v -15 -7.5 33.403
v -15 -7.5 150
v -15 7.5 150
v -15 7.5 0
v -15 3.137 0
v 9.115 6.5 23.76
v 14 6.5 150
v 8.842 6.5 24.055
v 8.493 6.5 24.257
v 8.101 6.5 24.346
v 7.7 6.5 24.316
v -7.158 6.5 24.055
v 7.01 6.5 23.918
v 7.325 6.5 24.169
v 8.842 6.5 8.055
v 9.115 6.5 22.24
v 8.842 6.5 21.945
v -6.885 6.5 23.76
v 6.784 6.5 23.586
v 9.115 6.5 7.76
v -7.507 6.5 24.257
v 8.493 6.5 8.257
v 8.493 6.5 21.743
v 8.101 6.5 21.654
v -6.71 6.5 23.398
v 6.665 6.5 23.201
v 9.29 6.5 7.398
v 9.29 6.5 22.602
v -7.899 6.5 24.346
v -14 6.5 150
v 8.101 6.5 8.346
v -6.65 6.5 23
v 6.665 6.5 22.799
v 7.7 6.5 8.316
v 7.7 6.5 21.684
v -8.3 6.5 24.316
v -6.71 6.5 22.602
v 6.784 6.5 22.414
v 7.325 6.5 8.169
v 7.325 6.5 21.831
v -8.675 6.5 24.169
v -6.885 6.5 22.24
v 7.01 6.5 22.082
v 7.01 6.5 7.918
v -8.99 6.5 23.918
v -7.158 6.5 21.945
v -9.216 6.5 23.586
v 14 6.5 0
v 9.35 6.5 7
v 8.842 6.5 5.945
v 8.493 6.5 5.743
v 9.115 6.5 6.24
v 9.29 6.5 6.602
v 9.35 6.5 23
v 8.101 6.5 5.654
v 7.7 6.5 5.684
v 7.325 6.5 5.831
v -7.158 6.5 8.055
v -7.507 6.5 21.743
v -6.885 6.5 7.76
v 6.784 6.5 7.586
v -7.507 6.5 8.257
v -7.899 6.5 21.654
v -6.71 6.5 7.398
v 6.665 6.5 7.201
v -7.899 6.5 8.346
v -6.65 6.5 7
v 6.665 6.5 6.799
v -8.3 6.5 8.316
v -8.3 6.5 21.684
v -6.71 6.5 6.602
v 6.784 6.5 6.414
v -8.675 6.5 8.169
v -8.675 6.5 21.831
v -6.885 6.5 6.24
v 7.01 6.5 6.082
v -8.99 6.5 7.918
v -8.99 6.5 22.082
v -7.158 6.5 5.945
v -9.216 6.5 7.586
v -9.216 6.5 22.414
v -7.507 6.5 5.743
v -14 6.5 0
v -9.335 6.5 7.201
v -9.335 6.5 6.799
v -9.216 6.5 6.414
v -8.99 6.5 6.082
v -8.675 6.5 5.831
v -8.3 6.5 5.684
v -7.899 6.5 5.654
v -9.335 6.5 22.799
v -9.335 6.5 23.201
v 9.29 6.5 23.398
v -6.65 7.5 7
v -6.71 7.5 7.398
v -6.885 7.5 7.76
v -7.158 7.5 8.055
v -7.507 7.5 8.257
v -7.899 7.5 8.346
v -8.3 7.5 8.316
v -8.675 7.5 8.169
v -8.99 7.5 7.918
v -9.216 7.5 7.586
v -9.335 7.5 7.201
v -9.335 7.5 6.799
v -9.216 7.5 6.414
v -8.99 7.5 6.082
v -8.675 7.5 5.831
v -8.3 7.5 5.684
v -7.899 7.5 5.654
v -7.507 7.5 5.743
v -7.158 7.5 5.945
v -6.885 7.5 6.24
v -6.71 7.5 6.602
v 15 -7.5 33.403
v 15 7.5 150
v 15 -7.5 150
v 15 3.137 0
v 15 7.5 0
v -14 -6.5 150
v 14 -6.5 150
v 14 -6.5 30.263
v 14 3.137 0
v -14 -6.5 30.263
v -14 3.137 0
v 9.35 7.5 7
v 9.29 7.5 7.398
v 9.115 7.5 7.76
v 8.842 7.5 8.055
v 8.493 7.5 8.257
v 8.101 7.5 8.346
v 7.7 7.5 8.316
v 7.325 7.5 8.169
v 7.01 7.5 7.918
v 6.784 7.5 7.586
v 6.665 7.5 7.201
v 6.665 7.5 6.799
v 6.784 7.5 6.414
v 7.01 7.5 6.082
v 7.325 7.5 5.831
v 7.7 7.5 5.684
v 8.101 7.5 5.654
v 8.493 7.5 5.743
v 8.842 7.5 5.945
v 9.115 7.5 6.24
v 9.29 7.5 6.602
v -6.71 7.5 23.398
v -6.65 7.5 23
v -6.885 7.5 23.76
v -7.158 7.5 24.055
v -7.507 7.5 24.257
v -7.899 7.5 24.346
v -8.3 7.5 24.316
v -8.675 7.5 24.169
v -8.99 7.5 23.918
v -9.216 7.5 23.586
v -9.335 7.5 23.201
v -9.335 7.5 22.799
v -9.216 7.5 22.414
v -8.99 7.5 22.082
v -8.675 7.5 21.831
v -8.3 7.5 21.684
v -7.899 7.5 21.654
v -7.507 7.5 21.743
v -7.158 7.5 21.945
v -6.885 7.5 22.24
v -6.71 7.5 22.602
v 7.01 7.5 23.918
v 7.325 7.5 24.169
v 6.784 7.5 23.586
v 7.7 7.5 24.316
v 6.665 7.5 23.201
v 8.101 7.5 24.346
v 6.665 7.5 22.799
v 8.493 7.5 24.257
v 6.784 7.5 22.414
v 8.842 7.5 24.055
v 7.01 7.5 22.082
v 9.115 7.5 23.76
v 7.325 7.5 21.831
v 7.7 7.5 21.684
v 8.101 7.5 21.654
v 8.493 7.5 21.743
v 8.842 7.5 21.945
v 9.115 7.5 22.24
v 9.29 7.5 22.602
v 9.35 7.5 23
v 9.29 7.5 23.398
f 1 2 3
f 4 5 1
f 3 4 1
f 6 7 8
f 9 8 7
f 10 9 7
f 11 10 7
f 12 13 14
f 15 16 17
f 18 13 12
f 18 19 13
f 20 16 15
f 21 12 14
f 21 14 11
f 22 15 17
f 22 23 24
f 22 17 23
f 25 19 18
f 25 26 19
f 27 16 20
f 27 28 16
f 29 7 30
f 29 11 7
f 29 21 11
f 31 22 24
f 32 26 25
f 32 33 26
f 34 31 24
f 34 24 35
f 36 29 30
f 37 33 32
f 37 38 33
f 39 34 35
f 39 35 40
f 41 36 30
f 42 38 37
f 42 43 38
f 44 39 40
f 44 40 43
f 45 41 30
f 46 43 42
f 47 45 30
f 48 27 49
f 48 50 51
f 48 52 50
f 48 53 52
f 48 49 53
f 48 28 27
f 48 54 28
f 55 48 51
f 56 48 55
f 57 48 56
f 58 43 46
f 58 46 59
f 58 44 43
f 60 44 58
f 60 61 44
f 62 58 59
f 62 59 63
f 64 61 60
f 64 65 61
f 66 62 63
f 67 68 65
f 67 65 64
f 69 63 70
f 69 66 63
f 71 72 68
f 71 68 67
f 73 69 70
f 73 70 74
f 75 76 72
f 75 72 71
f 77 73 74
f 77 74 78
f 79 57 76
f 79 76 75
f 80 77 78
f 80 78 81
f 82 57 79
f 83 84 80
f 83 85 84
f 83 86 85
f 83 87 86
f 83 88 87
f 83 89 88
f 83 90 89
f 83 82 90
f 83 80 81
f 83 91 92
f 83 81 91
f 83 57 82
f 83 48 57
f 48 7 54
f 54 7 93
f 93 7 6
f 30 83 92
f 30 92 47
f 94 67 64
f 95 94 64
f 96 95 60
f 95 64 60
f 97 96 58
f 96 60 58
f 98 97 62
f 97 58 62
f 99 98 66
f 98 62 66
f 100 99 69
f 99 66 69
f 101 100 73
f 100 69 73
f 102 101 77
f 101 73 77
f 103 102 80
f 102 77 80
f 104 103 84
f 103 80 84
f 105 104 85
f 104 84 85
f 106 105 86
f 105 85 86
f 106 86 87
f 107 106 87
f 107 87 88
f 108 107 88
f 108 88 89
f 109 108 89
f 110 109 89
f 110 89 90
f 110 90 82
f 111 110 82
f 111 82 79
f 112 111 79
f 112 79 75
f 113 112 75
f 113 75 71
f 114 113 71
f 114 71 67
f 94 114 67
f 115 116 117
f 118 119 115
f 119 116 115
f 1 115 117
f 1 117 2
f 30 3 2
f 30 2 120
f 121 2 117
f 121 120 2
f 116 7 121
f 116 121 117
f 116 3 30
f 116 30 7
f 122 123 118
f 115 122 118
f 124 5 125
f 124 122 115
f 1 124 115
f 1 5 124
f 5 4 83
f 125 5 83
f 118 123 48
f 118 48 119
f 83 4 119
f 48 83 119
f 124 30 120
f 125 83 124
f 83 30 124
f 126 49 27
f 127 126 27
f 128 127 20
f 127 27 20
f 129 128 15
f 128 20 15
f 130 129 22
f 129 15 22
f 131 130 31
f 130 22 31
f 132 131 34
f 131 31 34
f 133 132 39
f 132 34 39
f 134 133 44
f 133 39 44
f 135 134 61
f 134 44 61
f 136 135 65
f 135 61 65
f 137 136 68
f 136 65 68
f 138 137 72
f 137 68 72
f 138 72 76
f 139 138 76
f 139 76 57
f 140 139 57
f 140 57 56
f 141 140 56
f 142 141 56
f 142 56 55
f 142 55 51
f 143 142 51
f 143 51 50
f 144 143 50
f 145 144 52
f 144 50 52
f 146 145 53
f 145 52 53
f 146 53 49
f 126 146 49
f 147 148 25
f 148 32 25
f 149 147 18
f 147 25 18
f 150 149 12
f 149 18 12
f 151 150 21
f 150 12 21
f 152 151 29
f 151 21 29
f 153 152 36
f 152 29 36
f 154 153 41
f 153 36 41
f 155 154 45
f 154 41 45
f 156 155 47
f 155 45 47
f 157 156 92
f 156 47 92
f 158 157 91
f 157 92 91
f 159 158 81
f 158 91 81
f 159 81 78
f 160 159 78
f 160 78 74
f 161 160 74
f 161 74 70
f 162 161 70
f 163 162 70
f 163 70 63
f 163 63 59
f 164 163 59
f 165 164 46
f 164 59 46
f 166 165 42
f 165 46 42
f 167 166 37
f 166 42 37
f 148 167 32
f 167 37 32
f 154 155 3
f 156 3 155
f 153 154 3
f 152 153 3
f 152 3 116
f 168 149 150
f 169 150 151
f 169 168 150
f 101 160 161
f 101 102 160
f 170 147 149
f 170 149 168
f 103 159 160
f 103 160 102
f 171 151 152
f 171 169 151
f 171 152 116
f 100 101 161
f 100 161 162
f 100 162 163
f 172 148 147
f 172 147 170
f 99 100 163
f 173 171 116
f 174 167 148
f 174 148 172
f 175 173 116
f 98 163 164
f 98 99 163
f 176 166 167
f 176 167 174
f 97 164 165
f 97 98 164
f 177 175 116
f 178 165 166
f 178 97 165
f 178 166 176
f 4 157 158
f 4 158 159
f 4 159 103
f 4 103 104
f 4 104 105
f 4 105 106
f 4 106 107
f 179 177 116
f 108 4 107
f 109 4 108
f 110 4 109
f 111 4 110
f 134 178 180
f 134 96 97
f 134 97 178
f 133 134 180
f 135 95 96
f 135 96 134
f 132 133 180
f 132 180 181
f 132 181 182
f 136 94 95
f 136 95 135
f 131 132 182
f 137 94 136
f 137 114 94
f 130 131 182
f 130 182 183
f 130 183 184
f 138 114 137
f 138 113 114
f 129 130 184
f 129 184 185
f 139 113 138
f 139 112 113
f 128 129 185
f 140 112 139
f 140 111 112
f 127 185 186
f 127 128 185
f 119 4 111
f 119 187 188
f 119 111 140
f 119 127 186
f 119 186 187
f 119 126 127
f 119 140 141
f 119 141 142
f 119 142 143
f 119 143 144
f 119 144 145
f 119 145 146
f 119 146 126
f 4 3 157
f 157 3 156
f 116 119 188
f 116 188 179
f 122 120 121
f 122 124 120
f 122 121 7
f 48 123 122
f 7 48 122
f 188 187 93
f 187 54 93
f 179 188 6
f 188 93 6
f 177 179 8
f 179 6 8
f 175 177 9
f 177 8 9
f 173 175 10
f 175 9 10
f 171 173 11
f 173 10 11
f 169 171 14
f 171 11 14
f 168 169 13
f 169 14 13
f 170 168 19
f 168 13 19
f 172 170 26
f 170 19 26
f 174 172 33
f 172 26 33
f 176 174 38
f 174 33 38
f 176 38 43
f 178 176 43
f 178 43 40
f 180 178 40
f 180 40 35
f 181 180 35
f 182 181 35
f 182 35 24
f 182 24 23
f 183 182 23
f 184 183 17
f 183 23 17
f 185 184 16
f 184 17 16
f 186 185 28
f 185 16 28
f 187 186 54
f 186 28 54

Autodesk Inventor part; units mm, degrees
ref_plane "YZ Plane" through (0, 0, 0) normal (1, 0, 0) x (0, 1, 0)
ref_plane "XZ Plane" through (0, 0, 0) normal (0, 1, 0) x (-1, 0, 0)
ref_plane "XY Plane" through (0, 0, 0) normal (0, 0, 1) x (1, 0, 0)
sketch "草图1" plane through (0, 0, 0) normal (0, 0, 1) x (1, 0, 0)
  line L0 (15, -7.5) -> (-15, -7.5)
  line L1 (-15, -7.5) -> (-15, 7.5)
  line L2 (-15, 7.5) -> (15, 7.5)
  line L3 (15, 7.5) -> (15, -7.5)
  line L4 (15, -7.5) -> (-15, 7.5) construction
  line L5 (-15, -7.5) -> (15, 7.5) construction
  line L6 (14, 6.5) -> (-14, 6.5)
  line L7 (-14, 6.5) -> (-14, -6.5)
  line L8 (-14, -6.5) -> (14, -6.5)
  line L9 (14, -6.5) -> (14, 6.5)
  point P0 (0, 0)
  dimension "d0" = 30
  dimension "d1" = 15
  dimension "d2" = 1
extrude "拉伸1" add sketch "草图1" along normal blind 150
sketch "草图2" plane through (-15, -7.5, 0) normal (0, -1, 0) x (1, 0, 0)
  line L0 (-150, 0) -> (30, 0) projected
  line L1 (30, 30) -> (30, 0) projected
  line L2 (-150, 30) -> (30, 30) projected
  line L3 (-150, 30) -> (-150, 0) projected
  circle A0 centre (7, 7) radius 1.35 projected
  circle A1 centre (23, 7) radius 1.35 projected
  circle A2 centre (23, 23) radius 1.35 projected
  circle A3 centre (-109, 7) radius 1.35 projected
  circle A4 centre (7, 23) radius 1.35 projected
  circle A5 centre (-127, 23) radius 1.35 projected
  circle A6 centre (-127, 7) radius 1.35 projected
  circle A7 centre (-143, 7) radius 1.35 projected
  circle A8 centre (-11, 23) radius 1.35 projected
  circle A9 centre (-11, 7) radius 1.35 projected
  circle A10 centre (-109, 23) radius 1.35 projected
  circle A11 centre (-143, 23) radius 1.35 projected
  point P0 (15, 0)
extrude "拉伸2" cut sketch "草图2" against normal blind 23.75 contours A0 | A1 | A2 | A4
sketch "草图3" plane through (-15, -7.5, 0) normal (-1, 0, 0) x (0, 0, 1)
  line L0 (0, 0) -> (0, 15) projected
  line L1 (0, 10.637) -> (33.403, 0)
  line L2 (0, 0) -> (150, 0) projected
  point P0 (0, 7.5)
extrude "拉伸3" cut sketch "草图3" against normal blind 35
properties part number "40x15"
